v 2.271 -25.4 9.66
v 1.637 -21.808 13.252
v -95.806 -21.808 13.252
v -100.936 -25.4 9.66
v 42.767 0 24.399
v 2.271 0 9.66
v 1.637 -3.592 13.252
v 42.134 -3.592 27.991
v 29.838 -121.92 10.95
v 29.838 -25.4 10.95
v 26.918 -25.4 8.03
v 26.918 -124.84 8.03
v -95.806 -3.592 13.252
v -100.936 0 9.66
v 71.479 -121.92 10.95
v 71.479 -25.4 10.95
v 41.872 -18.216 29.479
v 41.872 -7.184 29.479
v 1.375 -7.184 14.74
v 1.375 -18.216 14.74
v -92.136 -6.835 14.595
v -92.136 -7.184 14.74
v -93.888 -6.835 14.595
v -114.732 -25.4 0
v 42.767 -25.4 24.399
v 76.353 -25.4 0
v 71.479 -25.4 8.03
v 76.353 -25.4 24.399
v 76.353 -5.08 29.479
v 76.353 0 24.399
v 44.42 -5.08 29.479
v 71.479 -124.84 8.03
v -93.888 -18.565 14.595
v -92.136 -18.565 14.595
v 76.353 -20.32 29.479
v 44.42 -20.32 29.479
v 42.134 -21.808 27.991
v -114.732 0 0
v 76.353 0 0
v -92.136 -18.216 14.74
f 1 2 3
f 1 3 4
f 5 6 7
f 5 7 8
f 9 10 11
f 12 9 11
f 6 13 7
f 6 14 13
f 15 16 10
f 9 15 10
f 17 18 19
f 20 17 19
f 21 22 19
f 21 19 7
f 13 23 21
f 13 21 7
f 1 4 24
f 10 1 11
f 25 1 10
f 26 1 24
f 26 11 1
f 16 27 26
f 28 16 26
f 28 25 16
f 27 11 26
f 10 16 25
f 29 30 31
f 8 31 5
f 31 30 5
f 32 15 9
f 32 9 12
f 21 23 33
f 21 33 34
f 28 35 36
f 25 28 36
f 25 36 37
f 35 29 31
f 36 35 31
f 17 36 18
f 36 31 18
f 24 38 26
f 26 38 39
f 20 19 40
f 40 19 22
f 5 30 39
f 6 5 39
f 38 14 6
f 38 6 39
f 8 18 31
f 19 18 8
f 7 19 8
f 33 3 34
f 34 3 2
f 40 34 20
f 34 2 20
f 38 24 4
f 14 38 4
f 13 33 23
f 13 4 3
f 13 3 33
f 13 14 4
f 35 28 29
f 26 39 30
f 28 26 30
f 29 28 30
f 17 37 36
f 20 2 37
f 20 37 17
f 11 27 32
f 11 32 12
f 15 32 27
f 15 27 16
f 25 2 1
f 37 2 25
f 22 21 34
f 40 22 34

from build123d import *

# Parameters (mm, degrees)
F0_W         = 23.517049849
F0_H         = 14.5949013531
F1_DEPTH     = 25.4
F2_T4_DEPTH  = 242.6459393762
F3_SIZE      = 5.08
F4_T1_DEPTH  = 127.9476749925
F5_W         = 46.7211659998
F5_H         = 2.9200753197
F6_DEPTH     = 127
F7_T1_DEPTH  = 114.6641495789
F7_T3_DEPTH  = 72.8494651575
F7_T8_DEPTH  = 58.5750464118
F7_T14_DEPTH = 58.5750464118
F7_T20_DEPTH = 58.5750464118
F7_T26_DEPTH = 104.9770798243
F7_T32_DEPTH = 104.9770798243
F7_T38_DEPTH = 104.9770798243
F7_T44_DEPTH = 104.9770798243
F7_T50_DEPTH = 104.9770798243
F7_T56_DEPTH = 104.9770798243
F7_T62_DEPTH = 58.5750464118
F7_T68_DEPTH = 58.5750464118
F7_T74_DEPTH = 58.5750464118
F7_T81_DEPTH = 104.9770798243
F7_T86_DEPTH = 58.5750464118
F7_T94_DEPTH = 104.9770798243
F7_T99_DEPTH = 58.5750464118


# Not quite as in the source:
# - a fillet or chamfer that OpenCascade refuses, or shapes differently, is made with other operations: its cross-section is extruded or revolved along the edge and cut away or added


with BuildPart() as f1:
    # F0 (on Front) → F1 (new body)
    with BuildSketch(Plane.XZ):
        with Locations((-103.8943566382, 7.2974506766)):
            Rectangle(F0_W, F0_H)
        Polygon((-92.1358317137, 0), (0, 0), (0, 14.7395525128), (-92.1358317137, 14.7395525128), (-92.1358317137, 14.5949013531), align=None)
        Polygon((0, 0), (76.3533711433, 0), (76.3533711433, 29.4791050255), (0, 29.4791050255), (0, 14.7395525128), align=None)
    extrude(amount=F1_DEPTH)

    # F2: chamfer of 15.24 x 41.8715558725 on 1 edges, made by hand


with BuildPart() as f2_tool2:
    # F2_s3 → F2_t4 (new body)
    with BuildSketch(Plane.XZ.offset(-108.6229696881)):
        Polygon((41.8715558725, 29.4791050255), (0, 14.2391050255), (0, 29.4791050255), align=None)
    extrude(amount=F2_T4_DEPTH)

    split(bisect_by=Plane.XY.offset(14.7395525128), keep=Keep.TOP)


with BuildPart() as f1_1:
    add(f1.part)

    # F2_t1: cut F2_tool2
    add(f2_tool2.part, mode=Mode.SUBTRACT)

    # F3
    f3_edges = [f1_1.edges().sort_by_distance(p)[0] for p in [
        (-45.380432, -25.4, 14.739553),
        (-45.380432, 0, 14.739553),
        (59.112464, -25.4, 29.479105),
        (21.623262, -25.4, 22.109329),
        (21.623262, 0, 22.109329),
        (59.112464, 0, 29.479105),
    ]]
    chamfer(f3_edges, length=F3_SIZE)

    # F4: chamfer of 15.24 x 21.7649756227 on 1 edges, made by hand

    # F4_s2 → F4_t1 (cut)
    with BuildSketch(Plane.XZ.offset(-51.2738374963)):
        Polygon((-115.6528815627, -0.6450986469), (-93.88790594, 14.5949013531), (-115.6528815627, 14.5949013531), align=None)
    extrude(amount=F4_T1_DEPTH, mode=Mode.SUBTRACT)

    # F5 (on face) → F6 (join)
    with BuildSketch(Plane(origin=(0, 0, 0), x_dir=(-1, 0, 0), z_dir=(0, 1, 0))):
        with Locations((-48.1185736135, 9.490238037)):
            Rectangle(F5_W, F5_H)
    extrude(amount=-F6_DEPTH)

    # F7: chamfer of 5.08 on 6 edges, made by hand

    # F7_s2 → F7_t1 (cut)
    with BuildSketch(Plane.XZ.offset(25.4)):
        with BuildLine():
            Line((29.9816747115, 11.0939597948), (24.6143065156, 5.7265915989))
            Line((24.6143065156, 5.7265915989), (24.5127065156, 5.7265915989))
            ThreePointArc((24.5127065156, 5.7265915989), (24.6563906136, 8.3384336478), (24.6563906136, 10.9502756968))
            Line((24.6563906136, 10.9502756968), (24.7579906136, 11.0518756968))
            ThreePointArc((24.7579906136, 11.0518756968), (27.3698326625, 11.0518756968), (29.9816747115, 11.1955597948))
            Line((29.9816747115, 11.1955597948), (29.9816747115, 11.0939597948))
        make_face()
    extrude(amount=F7_T1_DEPTH, mode=Mode.SUBTRACT)

    # F7_s4 → F7_t3 (cut)
    with BuildSketch(Plane.YZ.offset(11.6938410347)):
        with BuildLine():
            Line((-121.7763159021, 11.0939597948), (-127.1436840979, 5.7265915989))
            Line((-127.1436840979, 5.7265915989), (-127.2452840979, 5.7265915989))
            ThreePointArc((-127.2452840979, 5.7265915989), (-127.1016, 8.3384336478), (-127.1016, 10.9502756968))
            Line((-127.1016, 10.9502756968), (-127, 11.0518756968))
            ThreePointArc((-127, 11.0518756968), (-124.388157951, 11.0518756968), (-121.7763159021, 11.1955597948))
            Line((-121.7763159021, 11.1955597948), (-121.7763159021, 11.0939597948))
        make_face()
    extrude(amount=F7_T3_DEPTH, mode=Mode.SUBTRACT)


with BuildPart() as f7_tool6:
    # F7_s7 → F7_t8 (new body)
    with BuildSketch(Plane(origin=(0.563938989, 0, 0.2052570059), x_dir=(0, 1, 0), z_dir=(0.9396926208, 0, 0.3420201433))):
        with BuildLine():
            Line((-7.3719372179, 13.4581431925), (-3.4043701274, 11.814723094))
            Line((-3.4043701274, 11.814723094), (-3.3325280785, 11.886565143))
            ThreePointArc((-3.3325280785, 11.886565143), (-4.1978357766, 12.6419017936), (-5.008157951, 13.452223968))
            Line((-5.008157951, 13.452223968), (-5.08, 13.4819819191))
            ThreePointArc((-5.08, 13.4819819191), (-6.2259686089, 13.4819819191), (-7.3719372179, 13.5597431925))
            Line((-7.3719372179, 13.5597431925), (-7.3719372179, 13.4581431925))
        make_face()
    extrude(amount=F7_T8_DEPTH)

    split(bisect_by=Plane.XY.offset(14.7395525128), keep=Keep.BOTTOM)

    split(bisect_by=Plane(origin=(0, 4.8297762564, 4.8297762564), x_dir=(1, 0, 0), z_dir=(0, 0.7071067812, 0.7071067812)), keep=Keep.TOP)


with BuildPart() as f1_2:
    add(f1_1.part)

    # F7_t5: cut F7_tool6
    add(f7_tool6.part, mode=Mode.SUBTRACT)


with BuildPart() as f7_tool12:
    # F7_s13 → F7_t14 (new body)
    with BuildSketch(Plane(origin=(0.563938989, 0, 0.2052570059), x_dir=(0, 1, 0), z_dir=(0.9396926208, 0, 0.3420201433))):
        with BuildLine():
            Line((-7.3719372179, 13.4581431925), (-3.4043701274, 11.814723094))
            Line((-3.4043701274, 11.814723094), (-3.3325280785, 11.886565143))
            ThreePointArc((-3.3325280785, 11.886565143), (-4.1978357766, 12.6419017936), (-5.008157951, 13.452223968))
            Line((-5.008157951, 13.452223968), (-5.08, 13.4819819191))
            ThreePointArc((-5.08, 13.4819819191), (-6.2259686089, 13.4819819191), (-7.3719372179, 13.5597431925))
            Line((-7.3719372179, 13.5597431925), (-7.3719372179, 13.4581431925))
        make_face()
    extrude(amount=F7_T14_DEPTH)

    split(bisect_by=Plane.XY.offset(14.7395525128), keep=Keep.TOP)

    split(bisect_by=Plane(origin=(0, 4.8297762564, 4.8297762564), x_dir=(1, 0, 0), z_dir=(0, -0.7071067812, -0.7071067812)), keep=Keep.TOP)


with BuildPart() as f1_3:
    add(f1_2.part)

    # F7_t11: cut F7_tool12
    add(f7_tool12.part, mode=Mode.SUBTRACT)


with BuildPart() as f7_tool18:
    # F7_s19 → F7_t20 (new body)
    with BuildSketch(Plane(origin=(0.563938989, 0, 0.2052570059), x_dir=(0, 1, 0), z_dir=(0.9396926208, 0, 0.3420201433))):
        with BuildLine():
            Line((-7.3719372179, 13.4581431925), (-3.4043701274, 11.814723094))
            Line((-3.4043701274, 11.814723094), (-3.3325280785, 11.886565143))
            ThreePointArc((-3.3325280785, 11.886565143), (-4.1978357766, 12.6419017936), (-5.008157951, 13.452223968))
            Line((-5.008157951, 13.452223968), (-5.08, 13.4819819191))
            ThreePointArc((-5.08, 13.4819819191), (-6.2259686089, 13.4819819191), (-7.3719372179, 13.5597431925))
            Line((-7.3719372179, 13.5597431925), (-7.3719372179, 13.4581431925))
        make_face()
    extrude(amount=F7_T20_DEPTH)

    split(bisect_by=Plane.XY.offset(14.7395525128), keep=Keep.TOP)

    split(bisect_by=Plane(origin=(0, 4.8297762564, 4.8297762564), x_dir=(1, 0, 0), z_dir=(0, 0.7071067812, 0.7071067812)), keep=Keep.TOP)


with BuildPart() as f1_4:
    add(f1_3.part)

    # F7_t17: cut F7_tool18
    add(f7_tool18.part, mode=Mode.SUBTRACT)


with BuildPart() as f7_tool24:
    # F7_s25 → F7_t26 (new body)
    with BuildSketch(Plane.YZ.offset(-97.8689716836)):
        with BuildLine():
            Line((-7.3719372179, 14.8173137862), (-3.4043701274, 13.1738936877))
            Line((-3.4043701274, 13.1738936877), (-3.3325280785, 13.2457357367))
            ThreePointArc((-3.3325280785, 13.2457357367), (-4.1978357766, 14.0010723873), (-5.008157951, 14.8113945617))
            Line((-5.008157951, 14.8113945617), (-5.08, 14.8411525128))
            ThreePointArc((-5.08, 14.8411525128), (-6.2259686089, 14.8411525128), (-7.3719372179, 14.9189137862))
            Line((-7.3719372179, 14.9189137862), (-7.3719372179, 14.8173137862))
        make_face()
    extrude(amount=F7_T26_DEPTH)

    split(bisect_by=Plane(origin=(-4.5763601417, 0, 12.5734461526), x_dir=(0, 1, 0), z_dir=(-0.3420201433, 0, 0.9396926208)), keep=Keep.TOP)

    split(bisect_by=Plane(origin=(-1.4194489068, 4.1501909595, 3.8999038195), x_dir=(-0.9461886483, -0.3236155771, 0), z_dir=(-0.2418447626, 0.7071067812, 0.6644630244)), keep=Keep.TOP)


with BuildPart() as f1_5:
    add(f1_4.part)

    # F7_t23: cut F7_tool24
    add(f7_tool24.part, mode=Mode.SUBTRACT)


with BuildPart() as f7_tool30:
    # F7_s31 → F7_t32 (new body)
    with BuildSketch(Plane.YZ.offset(-97.8689716836)):
        with BuildLine():
            Line((-7.3719372179, 14.8173137862), (-3.4043701274, 13.1738936877))
            Line((-3.4043701274, 13.1738936877), (-3.3325280785, 13.2457357367))
            ThreePointArc((-3.3325280785, 13.2457357367), (-4.1978357766, 14.0010723873), (-5.008157951, 14.8113945617))
            Line((-5.008157951, 14.8113945617), (-5.08, 14.8411525128))
            ThreePointArc((-5.08, 14.8411525128), (-6.2259686089, 14.8411525128), (-7.3719372179, 14.9189137862))
            Line((-7.3719372179, 14.9189137862), (-7.3719372179, 14.8173137862))
        make_face()
    extrude(amount=F7_T32_DEPTH)

    split(bisect_by=Plane(origin=(-4.5763601417, 0, 12.5734461526), x_dir=(0, 1, 0), z_dir=(0.3420201433, 0, -0.9396926208)), keep=Keep.TOP)

    split(bisect_by=Plane(origin=(-1.4194489068, 4.1501909595, 3.8999038195), x_dir=(-0.9461886483, -0.3236155771, 0), z_dir=(-0.2418447626, 0.7071067812, 0.6644630244)), keep=Keep.TOP)


with BuildPart() as f1_6:
    add(f1_5.part)

    # F7_t29: cut F7_tool30
    add(f7_tool30.part, mode=Mode.SUBTRACT)


with BuildPart() as f7_tool36:
    # F7_s37 → F7_t38 (new body)
    with BuildSketch(Plane.YZ.offset(-97.8689716836)):
        with BuildLine():
            Line((-7.3719372179, 14.8173137862), (-3.4043701274, 13.1738936877))
            Line((-3.4043701274, 13.1738936877), (-3.3325280785, 13.2457357367))
            ThreePointArc((-3.3325280785, 13.2457357367), (-4.1978357766, 14.0010723873), (-5.008157951, 14.8113945617))
            Line((-5.008157951, 14.8113945617), (-5.08, 14.8411525128))
            ThreePointArc((-5.08, 14.8411525128), (-6.2259686089, 14.8411525128), (-7.3719372179, 14.9189137862))
            Line((-7.3719372179, 14.9189137862), (-7.3719372179, 14.8173137862))
        make_face()
    extrude(amount=F7_T38_DEPTH)

    split(bisect_by=Plane(origin=(-4.5763601417, 0, 12.5734461526), x_dir=(0, 1, 0), z_dir=(-0.3420201433, 0, 0.9396926208)), keep=Keep.TOP)

    split(bisect_by=Plane(origin=(-1.4194489068, 4.1501909595, 3.8999038195), x_dir=(0.9461886483, 0.3236155771, 0), z_dir=(0.2418447626, -0.7071067812, -0.6644630244)), keep=Keep.TOP)


with BuildPart() as f1_7:
    add(f1_6.part)

    # F7_t35: cut F7_tool36
    add(f7_tool36.part, mode=Mode.SUBTRACT)


with BuildPart() as f7_tool42:
    # F7_s43 → F7_t44 (new body)
    with BuildSketch(Plane.YZ.offset(7.1081081408)):
        with BuildLine():
            Line((-21.9956298726, 13.1738936877), (-18.0280627821, 14.8173137862))
            Line((-18.0280627821, 14.8173137862), (-18.0280627821, 14.9189137862))
            ThreePointArc((-18.0280627821, 14.9189137862), (-19.1740313911, 14.8411525128), (-20.32, 14.8411525128))
            Line((-20.32, 14.8411525128), (-20.391842049, 14.8113945617))
            ThreePointArc((-20.391842049, 14.8113945617), (-21.2021642234, 14.0010723873), (-22.0674719215, 13.2457357367))
            Line((-22.0674719215, 13.2457357367), (-21.9956298726, 13.1738936877))
        make_face()
    extrude(amount=-F7_T44_DEPTH)

    split(bisect_by=Plane(origin=(-5.763104727, -16.8501909595, 15.8340001035), x_dir=(-0.9461886483, 0.3236155771, 0), z_dir=(0.2418447626, 0.7071067812, -0.6644630244)), keep=Keep.TOP)

    split(bisect_by=Plane(origin=(-4.5763601417, 0, 12.5734461526), x_dir=(0, 1, 0), z_dir=(-0.3420201433, 0, 0.9396926208)), keep=Keep.TOP)


with BuildPart() as f1_8:
    add(f1_7.part)

    # F7_t41: cut F7_tool42
    add(f7_tool42.part, mode=Mode.SUBTRACT)


with BuildPart() as f7_tool48:
    # F7_s49 → F7_t50 (new body)
    with BuildSketch(Plane.YZ.offset(7.1081081408)):
        with BuildLine():
            Line((-21.9956298726, 13.1738936877), (-18.0280627821, 14.8173137862))
            Line((-18.0280627821, 14.8173137862), (-18.0280627821, 14.9189137862))
            ThreePointArc((-18.0280627821, 14.9189137862), (-19.1740313911, 14.8411525128), (-20.32, 14.8411525128))
            Line((-20.32, 14.8411525128), (-20.391842049, 14.8113945617))
            ThreePointArc((-20.391842049, 14.8113945617), (-21.2021642234, 14.0010723873), (-22.0674719215, 13.2457357367))
            Line((-22.0674719215, 13.2457357367), (-21.9956298726, 13.1738936877))
        make_face()
    extrude(amount=-F7_T50_DEPTH)

    split(bisect_by=Plane(origin=(-5.763104727, -16.8501909595, 15.8340001035), x_dir=(0.9461886483, -0.3236155771, 0), z_dir=(-0.2418447626, -0.7071067812, 0.6644630244)), keep=Keep.TOP)

    split(bisect_by=Plane(origin=(-4.5763601417, 0, 12.5734461526), x_dir=(0, 1, 0), z_dir=(0.3420201433, 0, -0.9396926208)), keep=Keep.TOP)


with BuildPart() as f1_9:
    add(f1_8.part)

    # F7_t47: cut F7_tool48
    add(f7_tool48.part, mode=Mode.SUBTRACT)


with BuildPart() as f7_tool54:
    # F7_s55 → F7_t56 (new body)
    with BuildSketch(Plane.YZ.offset(7.1081081408)):
        with BuildLine():
            Line((-21.9956298726, 13.1738936877), (-18.0280627821, 14.8173137862))
            Line((-18.0280627821, 14.8173137862), (-18.0280627821, 14.9189137862))
            ThreePointArc((-18.0280627821, 14.9189137862), (-19.1740313911, 14.8411525128), (-20.32, 14.8411525128))
            Line((-20.32, 14.8411525128), (-20.391842049, 14.8113945617))
            ThreePointArc((-20.391842049, 14.8113945617), (-21.2021642234, 14.0010723873), (-22.0674719215, 13.2457357367))
            Line((-22.0674719215, 13.2457357367), (-21.9956298726, 13.1738936877))
        make_face()
    extrude(amount=-F7_T56_DEPTH)

    split(bisect_by=Plane(origin=(-5.763104727, -16.8501909595, 15.8340001035), x_dir=(0.9461886483, -0.3236155771, 0), z_dir=(-0.2418447626, -0.7071067812, 0.6644630244)), keep=Keep.TOP)

    split(bisect_by=Plane(origin=(-4.5763601417, 0, 12.5734461526), x_dir=(0, 1, 0), z_dir=(-0.3420201433, 0, 0.9396926208)), keep=Keep.TOP)


with BuildPart() as f1_10:
    add(f1_9.part)

    # F7_t53: cut F7_tool54
    add(f7_tool54.part, mode=Mode.SUBTRACT)


with BuildPart() as f7_tool60:
    # F7_s61 → F7_t62 (new body)
    with BuildSketch(Plane(origin=(0.563938989, 0, 0.2052570059), x_dir=(0, 1, 0), z_dir=(0.9396926208, 0, 0.3420201433))):
        with BuildLine():
            Line((-21.9956298726, 11.814723094), (-18.0280627821, 13.4581431925))
            Line((-18.0280627821, 13.4581431925), (-18.0280627821, 13.5597431925))
            ThreePointArc((-18.0280627821, 13.5597431925), (-19.1740313911, 13.4819819191), (-20.32, 13.4819819191))
            Line((-20.32, 13.4819819191), (-20.391842049, 13.452223968))
            ThreePointArc((-20.391842049, 13.452223968), (-21.2021642234, 12.6419017936), (-22.0674719215, 11.886565143))
            Line((-22.0674719215, 11.886565143), (-21.9956298726, 11.814723094))
        make_face()
    extrude(amount=F7_T62_DEPTH)

    split(bisect_by=Plane(origin=(0, -17.5297762564, 17.5297762564), x_dir=(1, 0, 0), z_dir=(0, 0.7071067812, -0.7071067812)), keep=Keep.TOP)

    split(bisect_by=Plane.XY.offset(14.7395525128), keep=Keep.TOP)


with BuildPart() as f1_11:
    add(f1_10.part)

    # F7_t59: cut F7_tool60
    add(f7_tool60.part, mode=Mode.SUBTRACT)


with BuildPart() as f7_tool66:
    # F7_s67 → F7_t68 (new body)
    with BuildSketch(Plane(origin=(0.563938989, 0, 0.2052570059), x_dir=(0, 1, 0), z_dir=(0.9396926208, 0, 0.3420201433))):
        with BuildLine():
            Line((-21.9956298726, 11.814723094), (-18.0280627821, 13.4581431925))
            Line((-18.0280627821, 13.4581431925), (-18.0280627821, 13.5597431925))
            ThreePointArc((-18.0280627821, 13.5597431925), (-19.1740313911, 13.4819819191), (-20.32, 13.4819819191))
            Line((-20.32, 13.4819819191), (-20.391842049, 13.452223968))
            ThreePointArc((-20.391842049, 13.452223968), (-21.2021642234, 12.6419017936), (-22.0674719215, 11.886565143))
            Line((-22.0674719215, 11.886565143), (-21.9956298726, 11.814723094))
        make_face()
    extrude(amount=F7_T68_DEPTH)

    split(bisect_by=Plane(origin=(0, -17.5297762564, 17.5297762564), x_dir=(1, 0, 0), z_dir=(0, -0.7071067812, 0.7071067812)), keep=Keep.TOP)

    split(bisect_by=Plane.XY.offset(14.7395525128), keep=Keep.BOTTOM)


with BuildPart() as f1_12:
    add(f1_11.part)

    # F7_t65: cut F7_tool66
    add(f7_tool66.part, mode=Mode.SUBTRACT)


with BuildPart() as f7_tool72:
    # F7_s73 → F7_t74 (new body)
    with BuildSketch(Plane(origin=(0.563938989, 0, 0.2052570059), x_dir=(0, 1, 0), z_dir=(0.9396926208, 0, 0.3420201433))):
        with BuildLine():
            Line((-21.9956298726, 11.814723094), (-18.0280627821, 13.4581431925))
            Line((-18.0280627821, 13.4581431925), (-18.0280627821, 13.5597431925))
            ThreePointArc((-18.0280627821, 13.5597431925), (-19.1740313911, 13.4819819191), (-20.32, 13.4819819191))
            Line((-20.32, 13.4819819191), (-20.391842049, 13.452223968))
            ThreePointArc((-20.391842049, 13.452223968), (-21.2021642234, 12.6419017936), (-22.0674719215, 11.886565143))
            Line((-22.0674719215, 11.886565143), (-21.9956298726, 11.814723094))
        make_face()
    extrude(amount=F7_T74_DEPTH)

    split(bisect_by=Plane(origin=(0, -17.5297762564, 17.5297762564), x_dir=(1, 0, 0), z_dir=(0, -0.7071067812, 0.7071067812)), keep=Keep.TOP)

    split(bisect_by=Plane.XY.offset(14.7395525128), keep=Keep.TOP)


with BuildPart() as f1_13:
    add(f1_12.part)

    # F7_t71: cut F7_tool72
    add(f7_tool72.part, mode=Mode.SUBTRACT)


with BuildPart() as f7_tool79:
    # F7_s80 → F7_t81 (new body)
    with BuildSketch(Plane.YZ.offset(-97.8689716836)):
        with BuildLine():
            Line((-7.3719372179, 14.8173137862), (-3.4043701274, 13.1738936877))
            Line((-3.4043701274, 13.1738936877), (-3.3325280785, 13.2457357367))
            ThreePointArc((-3.3325280785, 13.2457357367), (-4.1978357766, 14.0010723873), (-5.008157951, 14.8113945617))
            Line((-5.008157951, 14.8113945617), (-5.08, 14.8411525128))
            ThreePointArc((-5.08, 14.8411525128), (-6.2259686089, 14.8411525128), (-7.3719372179, 14.9189137862))
            Line((-7.3719372179, 14.9189137862), (-7.3719372179, 14.8173137862))
        make_face()
    extrude(amount=F7_T81_DEPTH)

    split(bisect_by=Plane(origin=(-4.5763601417, 0, 12.5734461526), x_dir=(0, 1, 0), z_dir=(0.3420201433, 0, -0.9396926208)), keep=Keep.TOP)

    split(bisect_by=Plane(origin=(-1.4194489068, 4.1501909595, 3.8999038195), x_dir=(0.9461886483, 0.3236155771, 0), z_dir=(0.2418447626, -0.7071067812, -0.6644630244)), keep=Keep.TOP)


with BuildPart() as f7_tool84:
    # F7_s85 → F7_t86 (new body)
    with BuildSketch(Plane(origin=(0.563938989, 0, 0.2052570059), x_dir=(0, 1, 0), z_dir=(0.9396926208, 0, 0.3420201433))):
        with BuildLine():
            Line((-7.3719372179, 13.4581431925), (-3.4043701274, 11.814723094))
            Line((-3.4043701274, 11.814723094), (-3.3325280785, 11.886565143))
            ThreePointArc((-3.3325280785, 11.886565143), (-4.1978357766, 12.6419017936), (-5.008157951, 13.452223968))
            Line((-5.008157951, 13.452223968), (-5.08, 13.4819819191))
            ThreePointArc((-5.08, 13.4819819191), (-6.2259686089, 13.4819819191), (-7.3719372179, 13.5597431925))
            Line((-7.3719372179, 13.5597431925), (-7.3719372179, 13.4581431925))
        make_face()
    extrude(amount=F7_T86_DEPTH)

    split(bisect_by=Plane.XY.offset(14.7395525128), keep=Keep.BOTTOM)

    split(bisect_by=Plane(origin=(0, 4.8297762564, 4.8297762564), x_dir=(1, 0, 0), z_dir=(0, -0.7071067812, -0.7071067812)), keep=Keep.TOP)


with BuildPart() as f7_tool79_1:
    add(f7_tool79.part)

    # F7_t89: intersect F7_tool84
    add(f7_tool84.part, mode=Mode.INTERSECT)


with BuildPart() as f1_14:
    add(f1_13.part)

    # F7_t77: cut F7_tool79
    add(f7_tool79_1.part, mode=Mode.SUBTRACT)


with BuildPart() as f7_tool92:
    # F7_s93 → F7_t94 (new body)
    with BuildSketch(Plane.YZ.offset(7.1081081408)):
        with BuildLine():
            Line((-21.9956298726, 13.1738936877), (-18.0280627821, 14.8173137862))
            Line((-18.0280627821, 14.8173137862), (-18.0280627821, 14.9189137862))
            ThreePointArc((-18.0280627821, 14.9189137862), (-19.1740313911, 14.8411525128), (-20.32, 14.8411525128))
            Line((-20.32, 14.8411525128), (-20.391842049, 14.8113945617))
            ThreePointArc((-20.391842049, 14.8113945617), (-21.2021642234, 14.0010723873), (-22.0674719215, 13.2457357367))
            Line((-22.0674719215, 13.2457357367), (-21.9956298726, 13.1738936877))
        make_face()
    extrude(amount=-F7_T94_DEPTH)

    split(bisect_by=Plane(origin=(-5.763104727, -16.8501909595, 15.8340001035), x_dir=(-0.9461886483, 0.3236155771, 0), z_dir=(0.2418447626, 0.7071067812, -0.6644630244)), keep=Keep.TOP)

    split(bisect_by=Plane(origin=(-4.5763601417, 0, 12.5734461526), x_dir=(0, 1, 0), z_dir=(0.3420201433, 0, -0.9396926208)), keep=Keep.TOP)


with BuildPart() as f7_tool97:
    # F7_s98 → F7_t99 (new body)
    with BuildSketch(Plane(origin=(0.563938989, 0, 0.2052570059), x_dir=(0, 1, 0), z_dir=(0.9396926208, 0, 0.3420201433))):
        with BuildLine():
            Line((-21.9956298726, 11.814723094), (-18.0280627821, 13.4581431925))
            Line((-18.0280627821, 13.4581431925), (-18.0280627821, 13.5597431925))
            ThreePointArc((-18.0280627821, 13.5597431925), (-19.1740313911, 13.4819819191), (-20.32, 13.4819819191))
            Line((-20.32, 13.4819819191), (-20.391842049, 13.452223968))
            ThreePointArc((-20.391842049, 13.452223968), (-21.2021642234, 12.6419017936), (-22.0674719215, 11.886565143))
            Line((-22.0674719215, 11.886565143), (-21.9956298726, 11.814723094))
        make_face()
    extrude(amount=F7_T99_DEPTH)

    split(bisect_by=Plane(origin=(0, -17.5297762564, 17.5297762564), x_dir=(1, 0, 0), z_dir=(0, 0.7071067812, -0.7071067812)), keep=Keep.TOP)

    split(bisect_by=Plane.XY.offset(14.7395525128), keep=Keep.BOTTOM)


with BuildPart() as f7_tool92_1:
    add(f7_tool92.part)

    # F7_t102: intersect F7_tool97
    add(f7_tool97.part, mode=Mode.INTERSECT)


with BuildPart() as f1_15:
    add(f1_14.part)

    # F7_t90: cut F7_tool92
    add(f7_tool92_1.part, mode=Mode.SUBTRACT)


solid = f1_15.part
